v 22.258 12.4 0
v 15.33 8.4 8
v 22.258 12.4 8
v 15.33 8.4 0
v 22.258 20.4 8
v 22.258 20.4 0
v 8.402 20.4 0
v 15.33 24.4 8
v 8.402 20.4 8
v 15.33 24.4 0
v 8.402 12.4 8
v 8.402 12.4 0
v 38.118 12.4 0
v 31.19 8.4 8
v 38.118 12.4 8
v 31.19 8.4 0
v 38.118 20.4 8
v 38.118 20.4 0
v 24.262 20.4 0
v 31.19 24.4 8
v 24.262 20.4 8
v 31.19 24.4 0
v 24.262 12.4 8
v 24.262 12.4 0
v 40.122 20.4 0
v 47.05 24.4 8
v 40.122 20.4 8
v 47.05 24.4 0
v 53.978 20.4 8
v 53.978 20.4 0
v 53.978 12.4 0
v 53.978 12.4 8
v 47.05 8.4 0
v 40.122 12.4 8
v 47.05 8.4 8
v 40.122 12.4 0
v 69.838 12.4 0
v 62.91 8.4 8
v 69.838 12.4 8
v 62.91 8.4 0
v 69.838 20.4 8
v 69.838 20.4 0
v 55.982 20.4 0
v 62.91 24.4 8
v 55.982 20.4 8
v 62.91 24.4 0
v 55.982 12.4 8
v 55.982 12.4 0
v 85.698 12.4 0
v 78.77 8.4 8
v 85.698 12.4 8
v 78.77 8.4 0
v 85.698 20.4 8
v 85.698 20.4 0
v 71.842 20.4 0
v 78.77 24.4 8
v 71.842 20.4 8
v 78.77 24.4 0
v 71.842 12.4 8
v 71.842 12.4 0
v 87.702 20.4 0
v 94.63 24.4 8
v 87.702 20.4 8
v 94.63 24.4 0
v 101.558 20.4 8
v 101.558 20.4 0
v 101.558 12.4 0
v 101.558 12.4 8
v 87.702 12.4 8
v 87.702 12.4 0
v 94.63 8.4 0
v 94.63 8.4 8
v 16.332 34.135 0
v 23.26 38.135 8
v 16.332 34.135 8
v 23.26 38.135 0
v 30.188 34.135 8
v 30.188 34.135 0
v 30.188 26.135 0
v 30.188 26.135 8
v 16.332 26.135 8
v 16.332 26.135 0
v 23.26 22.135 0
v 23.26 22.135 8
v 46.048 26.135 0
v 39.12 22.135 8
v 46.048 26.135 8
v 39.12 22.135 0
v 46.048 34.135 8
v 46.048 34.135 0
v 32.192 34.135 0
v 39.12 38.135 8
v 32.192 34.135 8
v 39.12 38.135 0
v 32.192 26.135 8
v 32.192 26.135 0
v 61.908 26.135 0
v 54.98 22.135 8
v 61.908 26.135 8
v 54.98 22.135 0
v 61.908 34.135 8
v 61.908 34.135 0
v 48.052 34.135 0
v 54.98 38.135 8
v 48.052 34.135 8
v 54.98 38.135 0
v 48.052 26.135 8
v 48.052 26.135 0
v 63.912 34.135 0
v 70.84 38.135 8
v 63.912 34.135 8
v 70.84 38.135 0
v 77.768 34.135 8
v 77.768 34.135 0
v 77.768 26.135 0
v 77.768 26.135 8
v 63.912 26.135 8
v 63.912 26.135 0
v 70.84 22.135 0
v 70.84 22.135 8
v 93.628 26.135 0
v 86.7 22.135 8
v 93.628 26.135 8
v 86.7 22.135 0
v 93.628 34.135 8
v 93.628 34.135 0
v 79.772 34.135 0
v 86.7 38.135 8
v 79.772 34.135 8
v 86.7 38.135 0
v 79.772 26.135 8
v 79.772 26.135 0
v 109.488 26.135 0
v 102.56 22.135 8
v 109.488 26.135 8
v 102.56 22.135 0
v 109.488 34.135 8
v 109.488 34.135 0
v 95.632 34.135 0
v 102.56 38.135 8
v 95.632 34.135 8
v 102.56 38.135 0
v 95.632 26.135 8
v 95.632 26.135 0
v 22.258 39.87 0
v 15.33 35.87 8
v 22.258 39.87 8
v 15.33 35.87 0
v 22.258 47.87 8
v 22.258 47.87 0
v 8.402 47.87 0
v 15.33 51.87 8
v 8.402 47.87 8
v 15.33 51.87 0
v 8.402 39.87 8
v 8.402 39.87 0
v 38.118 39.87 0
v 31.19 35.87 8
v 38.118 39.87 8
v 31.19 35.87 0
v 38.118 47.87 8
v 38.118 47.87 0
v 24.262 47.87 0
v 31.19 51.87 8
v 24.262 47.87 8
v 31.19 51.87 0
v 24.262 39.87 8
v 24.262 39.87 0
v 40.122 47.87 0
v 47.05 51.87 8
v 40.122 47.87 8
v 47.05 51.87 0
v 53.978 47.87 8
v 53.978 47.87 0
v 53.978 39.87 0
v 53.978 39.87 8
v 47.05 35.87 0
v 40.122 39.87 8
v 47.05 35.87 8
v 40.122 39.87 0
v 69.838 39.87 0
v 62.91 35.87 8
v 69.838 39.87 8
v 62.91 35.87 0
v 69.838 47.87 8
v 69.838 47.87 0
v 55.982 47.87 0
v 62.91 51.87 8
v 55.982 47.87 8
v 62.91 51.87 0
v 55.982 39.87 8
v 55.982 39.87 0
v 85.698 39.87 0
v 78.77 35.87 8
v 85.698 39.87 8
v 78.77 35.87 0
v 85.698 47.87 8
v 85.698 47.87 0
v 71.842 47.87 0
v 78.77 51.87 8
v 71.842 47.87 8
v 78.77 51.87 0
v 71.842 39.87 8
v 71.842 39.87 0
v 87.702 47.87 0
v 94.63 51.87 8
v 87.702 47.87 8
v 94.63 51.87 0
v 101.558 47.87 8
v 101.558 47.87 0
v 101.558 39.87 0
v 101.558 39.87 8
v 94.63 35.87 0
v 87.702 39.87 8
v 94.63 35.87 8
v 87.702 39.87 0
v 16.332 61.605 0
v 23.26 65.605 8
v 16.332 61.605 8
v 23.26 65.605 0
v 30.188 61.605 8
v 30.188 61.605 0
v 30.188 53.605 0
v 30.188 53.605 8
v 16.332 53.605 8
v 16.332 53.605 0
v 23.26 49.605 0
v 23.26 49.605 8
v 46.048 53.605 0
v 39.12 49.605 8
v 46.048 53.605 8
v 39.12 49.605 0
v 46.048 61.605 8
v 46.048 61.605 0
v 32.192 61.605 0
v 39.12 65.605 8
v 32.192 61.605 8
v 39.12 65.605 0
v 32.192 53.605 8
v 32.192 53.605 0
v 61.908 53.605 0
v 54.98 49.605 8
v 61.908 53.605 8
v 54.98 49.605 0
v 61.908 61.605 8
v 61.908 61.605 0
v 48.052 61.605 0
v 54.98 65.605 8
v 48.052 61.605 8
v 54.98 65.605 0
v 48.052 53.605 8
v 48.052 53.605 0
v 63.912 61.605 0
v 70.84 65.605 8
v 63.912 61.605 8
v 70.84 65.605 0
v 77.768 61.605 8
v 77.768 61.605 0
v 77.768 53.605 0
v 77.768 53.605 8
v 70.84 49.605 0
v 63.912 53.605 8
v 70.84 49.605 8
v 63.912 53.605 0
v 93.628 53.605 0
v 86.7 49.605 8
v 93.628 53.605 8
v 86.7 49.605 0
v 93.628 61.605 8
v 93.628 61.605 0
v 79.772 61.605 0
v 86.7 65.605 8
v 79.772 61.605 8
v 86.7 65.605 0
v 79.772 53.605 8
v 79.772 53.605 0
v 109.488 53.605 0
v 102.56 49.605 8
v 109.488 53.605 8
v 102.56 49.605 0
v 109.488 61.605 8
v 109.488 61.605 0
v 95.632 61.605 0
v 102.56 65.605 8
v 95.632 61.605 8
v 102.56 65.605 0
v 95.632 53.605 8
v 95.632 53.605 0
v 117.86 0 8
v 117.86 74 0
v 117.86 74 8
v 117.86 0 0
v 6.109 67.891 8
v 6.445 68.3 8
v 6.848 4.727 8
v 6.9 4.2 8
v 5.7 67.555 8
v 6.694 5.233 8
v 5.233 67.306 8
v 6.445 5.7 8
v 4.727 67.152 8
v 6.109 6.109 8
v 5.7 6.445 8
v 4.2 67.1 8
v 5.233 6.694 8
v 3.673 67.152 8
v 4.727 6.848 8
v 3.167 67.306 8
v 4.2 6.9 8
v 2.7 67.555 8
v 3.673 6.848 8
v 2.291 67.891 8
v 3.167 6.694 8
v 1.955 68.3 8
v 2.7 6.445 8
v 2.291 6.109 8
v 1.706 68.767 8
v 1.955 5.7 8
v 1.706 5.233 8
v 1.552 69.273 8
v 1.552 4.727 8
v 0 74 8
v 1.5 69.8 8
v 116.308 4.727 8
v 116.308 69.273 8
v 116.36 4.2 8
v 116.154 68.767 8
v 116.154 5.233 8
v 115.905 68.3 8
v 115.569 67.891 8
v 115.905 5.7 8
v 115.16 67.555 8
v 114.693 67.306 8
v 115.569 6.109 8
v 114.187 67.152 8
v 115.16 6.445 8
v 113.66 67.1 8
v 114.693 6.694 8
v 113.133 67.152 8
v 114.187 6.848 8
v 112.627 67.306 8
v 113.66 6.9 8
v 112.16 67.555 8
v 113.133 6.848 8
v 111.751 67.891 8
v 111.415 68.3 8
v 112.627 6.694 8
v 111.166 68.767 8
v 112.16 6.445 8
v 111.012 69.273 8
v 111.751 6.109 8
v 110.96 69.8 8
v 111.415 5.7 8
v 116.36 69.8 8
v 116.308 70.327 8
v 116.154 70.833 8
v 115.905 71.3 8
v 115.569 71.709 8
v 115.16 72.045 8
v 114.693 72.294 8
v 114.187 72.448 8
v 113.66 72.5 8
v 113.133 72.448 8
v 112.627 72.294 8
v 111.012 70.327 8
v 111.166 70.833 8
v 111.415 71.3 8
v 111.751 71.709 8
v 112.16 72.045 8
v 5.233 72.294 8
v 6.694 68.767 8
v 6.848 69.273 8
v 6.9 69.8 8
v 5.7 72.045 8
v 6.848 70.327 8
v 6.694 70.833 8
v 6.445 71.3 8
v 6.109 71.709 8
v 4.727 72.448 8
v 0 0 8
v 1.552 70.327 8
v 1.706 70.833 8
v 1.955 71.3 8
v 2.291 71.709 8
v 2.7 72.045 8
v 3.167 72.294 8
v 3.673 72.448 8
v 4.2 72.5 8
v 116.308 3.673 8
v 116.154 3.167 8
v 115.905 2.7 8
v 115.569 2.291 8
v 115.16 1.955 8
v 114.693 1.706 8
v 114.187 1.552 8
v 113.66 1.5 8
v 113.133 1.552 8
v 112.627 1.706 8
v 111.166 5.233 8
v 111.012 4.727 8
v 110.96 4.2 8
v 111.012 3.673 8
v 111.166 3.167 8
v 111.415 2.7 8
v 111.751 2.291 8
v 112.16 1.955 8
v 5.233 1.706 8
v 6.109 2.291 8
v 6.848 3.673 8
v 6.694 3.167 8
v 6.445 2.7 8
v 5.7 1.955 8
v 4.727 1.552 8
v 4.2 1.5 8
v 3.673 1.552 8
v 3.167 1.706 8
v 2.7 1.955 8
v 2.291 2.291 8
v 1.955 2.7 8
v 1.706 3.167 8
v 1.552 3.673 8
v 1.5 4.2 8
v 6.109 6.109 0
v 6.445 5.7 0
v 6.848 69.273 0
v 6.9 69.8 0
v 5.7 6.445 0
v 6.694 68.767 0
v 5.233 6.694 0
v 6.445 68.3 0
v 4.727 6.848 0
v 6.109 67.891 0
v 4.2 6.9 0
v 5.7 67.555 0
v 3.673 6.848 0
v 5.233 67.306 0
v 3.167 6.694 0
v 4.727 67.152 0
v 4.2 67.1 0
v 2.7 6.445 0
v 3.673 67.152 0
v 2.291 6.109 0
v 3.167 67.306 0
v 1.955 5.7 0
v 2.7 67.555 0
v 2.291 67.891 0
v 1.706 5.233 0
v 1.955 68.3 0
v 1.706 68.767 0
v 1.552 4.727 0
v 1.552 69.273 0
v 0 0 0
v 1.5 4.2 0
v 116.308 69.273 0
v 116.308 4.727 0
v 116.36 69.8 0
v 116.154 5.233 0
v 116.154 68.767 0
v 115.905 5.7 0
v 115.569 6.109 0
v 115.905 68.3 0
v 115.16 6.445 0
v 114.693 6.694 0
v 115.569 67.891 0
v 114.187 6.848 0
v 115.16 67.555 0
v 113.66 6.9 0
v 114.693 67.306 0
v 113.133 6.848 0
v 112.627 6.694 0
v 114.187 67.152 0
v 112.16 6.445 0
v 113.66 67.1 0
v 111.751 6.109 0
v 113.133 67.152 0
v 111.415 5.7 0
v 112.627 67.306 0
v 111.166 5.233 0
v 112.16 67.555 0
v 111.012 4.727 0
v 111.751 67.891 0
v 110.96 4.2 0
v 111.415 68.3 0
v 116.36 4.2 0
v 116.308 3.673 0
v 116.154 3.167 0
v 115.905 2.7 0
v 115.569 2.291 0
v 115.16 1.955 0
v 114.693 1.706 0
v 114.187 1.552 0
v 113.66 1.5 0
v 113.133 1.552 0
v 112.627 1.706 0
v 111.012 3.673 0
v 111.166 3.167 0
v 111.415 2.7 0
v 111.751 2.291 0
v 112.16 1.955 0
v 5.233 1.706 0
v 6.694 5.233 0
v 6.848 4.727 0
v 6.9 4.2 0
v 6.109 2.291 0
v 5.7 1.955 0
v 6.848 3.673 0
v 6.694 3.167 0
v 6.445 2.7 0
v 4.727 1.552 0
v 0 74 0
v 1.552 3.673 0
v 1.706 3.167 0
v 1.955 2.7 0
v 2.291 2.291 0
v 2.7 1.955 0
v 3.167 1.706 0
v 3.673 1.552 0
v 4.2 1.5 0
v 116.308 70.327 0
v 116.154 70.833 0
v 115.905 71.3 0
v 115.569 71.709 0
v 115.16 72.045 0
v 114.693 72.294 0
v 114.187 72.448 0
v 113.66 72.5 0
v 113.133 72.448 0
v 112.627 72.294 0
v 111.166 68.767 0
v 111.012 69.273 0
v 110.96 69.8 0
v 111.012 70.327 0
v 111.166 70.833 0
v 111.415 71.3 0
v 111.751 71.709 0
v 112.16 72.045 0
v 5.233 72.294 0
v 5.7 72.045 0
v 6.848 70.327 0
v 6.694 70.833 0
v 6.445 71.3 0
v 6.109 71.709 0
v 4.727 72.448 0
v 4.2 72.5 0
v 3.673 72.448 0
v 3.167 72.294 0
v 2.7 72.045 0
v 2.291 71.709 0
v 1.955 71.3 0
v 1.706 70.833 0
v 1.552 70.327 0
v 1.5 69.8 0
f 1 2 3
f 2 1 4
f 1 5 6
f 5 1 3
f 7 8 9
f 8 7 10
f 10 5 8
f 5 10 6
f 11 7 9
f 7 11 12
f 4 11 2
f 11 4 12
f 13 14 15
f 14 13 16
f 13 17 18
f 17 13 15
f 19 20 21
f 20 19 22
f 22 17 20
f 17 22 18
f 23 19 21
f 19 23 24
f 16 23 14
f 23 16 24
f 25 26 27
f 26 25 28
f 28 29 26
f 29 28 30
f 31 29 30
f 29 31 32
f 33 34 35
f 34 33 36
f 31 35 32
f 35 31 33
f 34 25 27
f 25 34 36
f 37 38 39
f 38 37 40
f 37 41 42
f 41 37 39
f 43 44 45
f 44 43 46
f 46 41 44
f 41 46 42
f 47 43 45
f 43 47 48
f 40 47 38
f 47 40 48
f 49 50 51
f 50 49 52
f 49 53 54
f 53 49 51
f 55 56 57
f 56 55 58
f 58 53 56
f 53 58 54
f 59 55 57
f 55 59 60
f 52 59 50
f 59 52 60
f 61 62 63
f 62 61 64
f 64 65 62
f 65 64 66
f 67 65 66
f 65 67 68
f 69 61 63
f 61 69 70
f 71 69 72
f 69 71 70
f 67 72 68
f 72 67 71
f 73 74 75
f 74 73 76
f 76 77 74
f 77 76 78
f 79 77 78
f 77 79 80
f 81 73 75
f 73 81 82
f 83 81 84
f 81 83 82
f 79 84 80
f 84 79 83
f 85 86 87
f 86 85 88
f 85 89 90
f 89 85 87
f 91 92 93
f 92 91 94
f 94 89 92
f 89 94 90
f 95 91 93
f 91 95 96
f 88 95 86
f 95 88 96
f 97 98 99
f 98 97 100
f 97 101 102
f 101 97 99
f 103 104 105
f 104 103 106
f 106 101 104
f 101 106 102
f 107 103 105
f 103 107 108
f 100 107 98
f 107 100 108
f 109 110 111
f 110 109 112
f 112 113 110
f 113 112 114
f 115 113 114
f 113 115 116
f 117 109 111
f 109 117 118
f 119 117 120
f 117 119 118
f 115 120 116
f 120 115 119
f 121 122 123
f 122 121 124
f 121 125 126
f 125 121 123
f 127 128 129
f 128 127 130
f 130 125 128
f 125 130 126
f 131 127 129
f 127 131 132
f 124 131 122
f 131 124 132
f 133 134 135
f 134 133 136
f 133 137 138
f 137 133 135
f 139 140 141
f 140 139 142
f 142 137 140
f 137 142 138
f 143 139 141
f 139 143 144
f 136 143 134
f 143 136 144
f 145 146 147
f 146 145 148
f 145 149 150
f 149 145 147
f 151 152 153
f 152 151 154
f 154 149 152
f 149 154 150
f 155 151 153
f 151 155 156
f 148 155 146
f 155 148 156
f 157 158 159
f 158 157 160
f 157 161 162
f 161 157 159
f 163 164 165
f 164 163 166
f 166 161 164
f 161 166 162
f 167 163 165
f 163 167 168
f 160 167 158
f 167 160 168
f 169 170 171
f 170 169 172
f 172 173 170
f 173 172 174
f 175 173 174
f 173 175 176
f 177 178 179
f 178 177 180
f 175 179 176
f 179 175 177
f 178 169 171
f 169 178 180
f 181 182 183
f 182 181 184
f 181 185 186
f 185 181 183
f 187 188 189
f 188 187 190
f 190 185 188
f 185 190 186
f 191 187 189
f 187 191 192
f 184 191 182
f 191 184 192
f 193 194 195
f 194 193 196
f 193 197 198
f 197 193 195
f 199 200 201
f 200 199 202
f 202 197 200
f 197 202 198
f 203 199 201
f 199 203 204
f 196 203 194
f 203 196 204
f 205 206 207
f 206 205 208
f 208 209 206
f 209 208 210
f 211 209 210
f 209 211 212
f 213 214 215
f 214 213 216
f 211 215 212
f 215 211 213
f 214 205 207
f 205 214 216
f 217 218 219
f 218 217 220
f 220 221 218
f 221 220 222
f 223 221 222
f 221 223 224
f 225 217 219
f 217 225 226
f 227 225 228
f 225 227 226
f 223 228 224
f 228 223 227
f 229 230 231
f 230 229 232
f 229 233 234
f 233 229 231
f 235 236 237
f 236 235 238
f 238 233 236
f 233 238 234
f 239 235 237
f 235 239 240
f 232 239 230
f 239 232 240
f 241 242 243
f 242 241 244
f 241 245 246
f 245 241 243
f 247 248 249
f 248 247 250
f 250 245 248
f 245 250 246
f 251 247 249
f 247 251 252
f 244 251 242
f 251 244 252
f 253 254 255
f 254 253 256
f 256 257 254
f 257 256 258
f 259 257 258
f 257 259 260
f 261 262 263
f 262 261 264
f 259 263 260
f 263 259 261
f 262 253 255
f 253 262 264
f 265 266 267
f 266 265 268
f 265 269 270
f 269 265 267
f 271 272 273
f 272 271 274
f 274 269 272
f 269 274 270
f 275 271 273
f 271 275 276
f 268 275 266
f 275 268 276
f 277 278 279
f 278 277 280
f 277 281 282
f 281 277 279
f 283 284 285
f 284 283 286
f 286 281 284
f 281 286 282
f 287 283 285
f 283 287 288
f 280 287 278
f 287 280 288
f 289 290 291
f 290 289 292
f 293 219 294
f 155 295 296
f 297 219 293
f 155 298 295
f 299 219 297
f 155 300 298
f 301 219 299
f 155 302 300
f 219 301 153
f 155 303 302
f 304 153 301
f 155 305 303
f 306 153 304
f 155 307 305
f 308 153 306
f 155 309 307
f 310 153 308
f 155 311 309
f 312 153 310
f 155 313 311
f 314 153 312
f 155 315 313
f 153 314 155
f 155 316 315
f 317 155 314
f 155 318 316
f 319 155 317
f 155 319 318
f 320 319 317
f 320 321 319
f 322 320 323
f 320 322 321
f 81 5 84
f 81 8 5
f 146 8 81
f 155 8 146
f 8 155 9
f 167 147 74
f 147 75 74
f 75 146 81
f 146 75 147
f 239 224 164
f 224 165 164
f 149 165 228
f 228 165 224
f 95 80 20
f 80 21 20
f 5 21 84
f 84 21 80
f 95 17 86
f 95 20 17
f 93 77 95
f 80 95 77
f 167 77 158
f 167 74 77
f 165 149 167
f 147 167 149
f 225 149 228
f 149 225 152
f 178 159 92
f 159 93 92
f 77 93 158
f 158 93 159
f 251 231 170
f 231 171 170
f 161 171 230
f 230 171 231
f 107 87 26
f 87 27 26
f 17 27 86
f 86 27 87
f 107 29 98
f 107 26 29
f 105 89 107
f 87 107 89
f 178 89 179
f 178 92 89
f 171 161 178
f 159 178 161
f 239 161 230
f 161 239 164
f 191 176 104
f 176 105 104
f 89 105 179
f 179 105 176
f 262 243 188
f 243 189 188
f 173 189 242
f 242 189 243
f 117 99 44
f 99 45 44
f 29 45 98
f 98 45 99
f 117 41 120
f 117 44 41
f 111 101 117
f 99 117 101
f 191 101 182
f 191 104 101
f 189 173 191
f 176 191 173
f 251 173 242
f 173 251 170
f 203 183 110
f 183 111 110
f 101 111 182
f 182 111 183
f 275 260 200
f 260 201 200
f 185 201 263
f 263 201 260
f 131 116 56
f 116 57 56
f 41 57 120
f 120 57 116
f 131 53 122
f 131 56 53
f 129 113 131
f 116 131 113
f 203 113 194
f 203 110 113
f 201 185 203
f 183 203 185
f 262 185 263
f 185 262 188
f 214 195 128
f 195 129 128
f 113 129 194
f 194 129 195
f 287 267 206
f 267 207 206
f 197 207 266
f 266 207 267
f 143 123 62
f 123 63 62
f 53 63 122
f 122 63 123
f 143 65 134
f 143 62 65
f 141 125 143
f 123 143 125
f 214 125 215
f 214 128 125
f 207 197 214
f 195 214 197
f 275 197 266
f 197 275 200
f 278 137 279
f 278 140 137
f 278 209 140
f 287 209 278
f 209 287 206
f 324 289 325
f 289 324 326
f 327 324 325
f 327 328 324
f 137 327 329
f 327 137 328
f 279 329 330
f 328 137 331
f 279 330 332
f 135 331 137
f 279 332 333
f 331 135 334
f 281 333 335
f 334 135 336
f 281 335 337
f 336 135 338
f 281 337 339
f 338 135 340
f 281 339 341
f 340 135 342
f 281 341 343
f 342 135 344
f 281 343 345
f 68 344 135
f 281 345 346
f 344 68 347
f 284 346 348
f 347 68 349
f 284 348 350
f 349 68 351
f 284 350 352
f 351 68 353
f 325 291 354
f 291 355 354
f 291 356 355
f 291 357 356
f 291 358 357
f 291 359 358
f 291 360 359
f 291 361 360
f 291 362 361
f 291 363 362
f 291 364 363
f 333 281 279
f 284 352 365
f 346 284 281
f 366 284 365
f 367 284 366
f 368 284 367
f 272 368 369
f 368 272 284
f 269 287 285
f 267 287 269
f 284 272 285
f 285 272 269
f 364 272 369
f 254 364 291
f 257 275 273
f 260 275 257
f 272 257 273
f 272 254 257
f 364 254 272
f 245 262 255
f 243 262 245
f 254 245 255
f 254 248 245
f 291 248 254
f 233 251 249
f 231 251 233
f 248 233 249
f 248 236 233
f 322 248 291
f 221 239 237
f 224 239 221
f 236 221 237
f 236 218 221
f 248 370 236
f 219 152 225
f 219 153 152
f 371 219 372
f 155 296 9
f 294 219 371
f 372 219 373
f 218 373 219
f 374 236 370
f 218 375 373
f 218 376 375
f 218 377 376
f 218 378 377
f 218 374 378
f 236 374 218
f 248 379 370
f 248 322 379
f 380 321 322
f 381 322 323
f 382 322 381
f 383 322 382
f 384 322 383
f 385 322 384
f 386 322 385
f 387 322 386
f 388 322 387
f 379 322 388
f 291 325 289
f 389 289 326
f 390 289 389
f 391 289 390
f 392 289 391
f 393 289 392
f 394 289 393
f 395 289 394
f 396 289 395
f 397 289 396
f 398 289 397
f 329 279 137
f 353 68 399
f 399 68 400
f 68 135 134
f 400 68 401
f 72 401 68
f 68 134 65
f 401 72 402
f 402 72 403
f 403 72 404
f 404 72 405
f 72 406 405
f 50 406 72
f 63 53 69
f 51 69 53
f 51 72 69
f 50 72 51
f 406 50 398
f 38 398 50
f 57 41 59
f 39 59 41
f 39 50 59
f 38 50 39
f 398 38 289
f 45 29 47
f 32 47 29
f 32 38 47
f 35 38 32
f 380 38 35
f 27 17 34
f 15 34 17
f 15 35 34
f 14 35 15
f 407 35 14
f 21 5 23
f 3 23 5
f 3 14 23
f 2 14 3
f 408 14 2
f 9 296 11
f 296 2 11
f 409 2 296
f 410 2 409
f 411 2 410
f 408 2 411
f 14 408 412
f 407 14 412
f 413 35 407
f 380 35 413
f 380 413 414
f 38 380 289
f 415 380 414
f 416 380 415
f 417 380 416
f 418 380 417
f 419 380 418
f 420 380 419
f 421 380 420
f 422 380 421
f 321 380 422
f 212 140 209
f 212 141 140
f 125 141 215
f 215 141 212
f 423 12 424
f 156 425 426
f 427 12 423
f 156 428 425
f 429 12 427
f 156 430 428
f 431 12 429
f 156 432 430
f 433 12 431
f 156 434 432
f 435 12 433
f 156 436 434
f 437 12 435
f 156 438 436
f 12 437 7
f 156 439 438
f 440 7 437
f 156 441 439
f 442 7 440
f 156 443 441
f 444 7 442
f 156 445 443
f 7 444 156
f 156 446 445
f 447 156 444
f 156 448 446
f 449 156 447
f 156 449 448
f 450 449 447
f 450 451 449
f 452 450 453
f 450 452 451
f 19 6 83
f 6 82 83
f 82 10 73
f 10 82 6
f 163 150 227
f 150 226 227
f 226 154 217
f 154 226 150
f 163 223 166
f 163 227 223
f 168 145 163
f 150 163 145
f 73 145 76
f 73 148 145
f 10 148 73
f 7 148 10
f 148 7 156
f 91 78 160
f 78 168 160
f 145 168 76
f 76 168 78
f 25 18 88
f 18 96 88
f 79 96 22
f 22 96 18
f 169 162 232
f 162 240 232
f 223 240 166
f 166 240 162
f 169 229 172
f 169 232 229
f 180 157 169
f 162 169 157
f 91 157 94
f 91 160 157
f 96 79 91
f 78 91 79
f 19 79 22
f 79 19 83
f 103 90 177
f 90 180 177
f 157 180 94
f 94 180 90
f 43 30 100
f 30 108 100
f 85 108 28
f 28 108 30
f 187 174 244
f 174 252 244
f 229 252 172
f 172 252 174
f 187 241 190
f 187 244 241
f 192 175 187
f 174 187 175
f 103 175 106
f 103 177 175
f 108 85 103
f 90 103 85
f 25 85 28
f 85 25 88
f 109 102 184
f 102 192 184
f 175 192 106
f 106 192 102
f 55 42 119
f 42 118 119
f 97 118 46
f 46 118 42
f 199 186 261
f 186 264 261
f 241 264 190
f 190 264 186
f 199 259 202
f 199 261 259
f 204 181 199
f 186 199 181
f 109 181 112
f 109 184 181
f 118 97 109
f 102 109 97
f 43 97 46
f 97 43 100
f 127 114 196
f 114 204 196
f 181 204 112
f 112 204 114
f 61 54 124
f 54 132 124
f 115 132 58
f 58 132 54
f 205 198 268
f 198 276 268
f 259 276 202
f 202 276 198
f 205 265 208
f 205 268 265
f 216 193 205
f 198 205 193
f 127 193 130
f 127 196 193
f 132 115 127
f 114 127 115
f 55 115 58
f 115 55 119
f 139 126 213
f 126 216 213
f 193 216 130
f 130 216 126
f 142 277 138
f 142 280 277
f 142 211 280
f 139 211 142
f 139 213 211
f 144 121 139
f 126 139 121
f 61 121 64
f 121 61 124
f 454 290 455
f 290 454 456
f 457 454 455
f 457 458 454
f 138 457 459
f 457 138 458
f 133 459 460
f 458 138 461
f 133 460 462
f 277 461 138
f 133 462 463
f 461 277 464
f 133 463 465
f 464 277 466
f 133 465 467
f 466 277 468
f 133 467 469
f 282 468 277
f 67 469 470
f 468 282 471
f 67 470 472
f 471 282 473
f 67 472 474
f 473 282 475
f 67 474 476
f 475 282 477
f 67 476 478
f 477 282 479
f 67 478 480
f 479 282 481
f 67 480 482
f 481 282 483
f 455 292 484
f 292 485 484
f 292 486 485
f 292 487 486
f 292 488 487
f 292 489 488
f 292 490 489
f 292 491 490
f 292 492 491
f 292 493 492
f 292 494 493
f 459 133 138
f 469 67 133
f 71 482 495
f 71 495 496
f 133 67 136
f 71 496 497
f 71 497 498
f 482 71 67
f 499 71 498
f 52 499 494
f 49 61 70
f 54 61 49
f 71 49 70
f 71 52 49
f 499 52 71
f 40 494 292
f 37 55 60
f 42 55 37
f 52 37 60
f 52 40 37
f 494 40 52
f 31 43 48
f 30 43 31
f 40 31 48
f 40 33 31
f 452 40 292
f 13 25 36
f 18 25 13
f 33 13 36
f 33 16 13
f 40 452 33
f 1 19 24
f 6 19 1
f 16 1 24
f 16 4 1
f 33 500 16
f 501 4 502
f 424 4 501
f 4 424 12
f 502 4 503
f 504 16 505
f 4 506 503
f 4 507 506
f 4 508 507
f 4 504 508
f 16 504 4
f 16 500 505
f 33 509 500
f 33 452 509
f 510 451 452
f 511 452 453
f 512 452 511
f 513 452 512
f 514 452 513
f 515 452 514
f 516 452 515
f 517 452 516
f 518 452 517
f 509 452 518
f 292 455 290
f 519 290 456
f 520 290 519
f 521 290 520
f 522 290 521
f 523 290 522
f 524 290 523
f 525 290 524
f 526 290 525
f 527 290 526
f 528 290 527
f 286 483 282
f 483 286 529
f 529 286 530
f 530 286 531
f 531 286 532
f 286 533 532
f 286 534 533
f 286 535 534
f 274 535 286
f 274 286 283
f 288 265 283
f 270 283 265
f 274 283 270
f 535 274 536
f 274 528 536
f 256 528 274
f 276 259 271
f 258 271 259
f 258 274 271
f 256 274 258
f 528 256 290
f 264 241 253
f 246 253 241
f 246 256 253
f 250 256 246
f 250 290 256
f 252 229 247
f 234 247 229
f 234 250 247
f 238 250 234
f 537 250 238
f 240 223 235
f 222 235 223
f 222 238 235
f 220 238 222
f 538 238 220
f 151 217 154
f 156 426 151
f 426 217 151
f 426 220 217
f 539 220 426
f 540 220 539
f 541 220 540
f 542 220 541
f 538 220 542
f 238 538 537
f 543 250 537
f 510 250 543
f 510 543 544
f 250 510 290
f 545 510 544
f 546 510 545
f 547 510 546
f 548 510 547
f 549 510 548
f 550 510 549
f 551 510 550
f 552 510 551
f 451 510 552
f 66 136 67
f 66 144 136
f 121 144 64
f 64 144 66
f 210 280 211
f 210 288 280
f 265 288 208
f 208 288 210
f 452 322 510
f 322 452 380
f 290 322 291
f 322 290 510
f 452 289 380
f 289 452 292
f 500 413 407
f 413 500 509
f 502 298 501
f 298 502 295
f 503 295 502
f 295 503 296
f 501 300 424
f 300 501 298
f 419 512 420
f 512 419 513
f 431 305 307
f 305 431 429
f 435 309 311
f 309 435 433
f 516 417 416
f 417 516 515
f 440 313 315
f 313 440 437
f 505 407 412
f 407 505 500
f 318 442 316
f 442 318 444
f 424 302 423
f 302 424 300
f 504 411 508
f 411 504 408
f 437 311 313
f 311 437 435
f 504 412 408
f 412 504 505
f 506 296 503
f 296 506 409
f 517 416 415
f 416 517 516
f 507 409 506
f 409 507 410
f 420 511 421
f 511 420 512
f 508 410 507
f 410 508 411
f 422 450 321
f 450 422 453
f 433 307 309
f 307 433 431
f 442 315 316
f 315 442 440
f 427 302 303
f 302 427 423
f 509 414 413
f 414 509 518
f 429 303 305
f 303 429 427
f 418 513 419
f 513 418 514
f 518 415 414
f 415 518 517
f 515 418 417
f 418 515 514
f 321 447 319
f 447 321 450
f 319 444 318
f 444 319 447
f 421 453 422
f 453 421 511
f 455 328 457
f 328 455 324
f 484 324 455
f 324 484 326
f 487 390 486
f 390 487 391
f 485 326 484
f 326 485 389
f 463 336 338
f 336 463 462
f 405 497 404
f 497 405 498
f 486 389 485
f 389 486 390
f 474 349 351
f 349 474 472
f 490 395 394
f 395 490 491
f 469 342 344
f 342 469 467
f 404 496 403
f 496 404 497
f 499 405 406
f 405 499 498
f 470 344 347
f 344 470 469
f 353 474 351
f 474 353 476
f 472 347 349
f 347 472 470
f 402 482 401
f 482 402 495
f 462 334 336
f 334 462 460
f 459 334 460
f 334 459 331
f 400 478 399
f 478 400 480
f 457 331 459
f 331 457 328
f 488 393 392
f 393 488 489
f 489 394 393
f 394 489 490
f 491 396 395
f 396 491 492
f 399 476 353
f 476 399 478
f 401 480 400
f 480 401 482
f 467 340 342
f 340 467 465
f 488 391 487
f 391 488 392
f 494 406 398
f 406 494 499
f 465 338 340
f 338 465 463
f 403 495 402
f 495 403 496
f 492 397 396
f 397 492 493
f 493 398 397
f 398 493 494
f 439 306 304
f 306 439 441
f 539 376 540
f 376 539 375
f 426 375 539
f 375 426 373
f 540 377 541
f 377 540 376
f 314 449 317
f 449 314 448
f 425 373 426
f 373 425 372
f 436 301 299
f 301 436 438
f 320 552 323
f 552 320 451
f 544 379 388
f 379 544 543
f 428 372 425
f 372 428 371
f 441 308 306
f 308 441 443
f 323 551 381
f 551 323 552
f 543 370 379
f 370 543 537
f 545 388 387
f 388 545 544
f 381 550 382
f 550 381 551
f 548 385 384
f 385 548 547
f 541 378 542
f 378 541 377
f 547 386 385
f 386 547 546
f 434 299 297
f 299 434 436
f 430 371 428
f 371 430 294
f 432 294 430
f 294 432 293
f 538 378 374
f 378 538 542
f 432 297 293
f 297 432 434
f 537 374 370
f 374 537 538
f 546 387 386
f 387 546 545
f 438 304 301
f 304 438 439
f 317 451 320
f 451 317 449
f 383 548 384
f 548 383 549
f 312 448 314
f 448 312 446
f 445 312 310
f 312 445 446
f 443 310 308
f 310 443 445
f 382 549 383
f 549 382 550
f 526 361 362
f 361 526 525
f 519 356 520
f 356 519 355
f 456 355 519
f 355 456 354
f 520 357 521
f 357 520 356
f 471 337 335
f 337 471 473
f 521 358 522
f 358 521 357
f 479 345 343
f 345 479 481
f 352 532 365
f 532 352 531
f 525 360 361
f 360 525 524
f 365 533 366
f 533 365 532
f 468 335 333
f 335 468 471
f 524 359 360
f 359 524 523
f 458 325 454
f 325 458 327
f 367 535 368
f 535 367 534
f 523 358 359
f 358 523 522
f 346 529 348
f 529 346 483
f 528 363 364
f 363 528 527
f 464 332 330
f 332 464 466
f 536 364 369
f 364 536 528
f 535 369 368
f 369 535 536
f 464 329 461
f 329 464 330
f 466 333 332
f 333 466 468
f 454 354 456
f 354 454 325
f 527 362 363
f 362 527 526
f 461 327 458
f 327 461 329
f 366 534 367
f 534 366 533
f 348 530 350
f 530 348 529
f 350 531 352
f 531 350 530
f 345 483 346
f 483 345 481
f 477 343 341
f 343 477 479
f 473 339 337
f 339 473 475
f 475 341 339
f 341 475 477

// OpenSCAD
$fn = 32;

// ----------------------------------------------------------------------
// Honeycomb panel: 117.86 x 74 mm, 24 cells of 16 mm
// ----------------------------------------------------------------------

// --- parameters (mm) ---
panel_w = 117.86;         // panel width
panel_d = 74;             // panel depth
thick = 8;                // panel thickness
cell_r = 8;               // hex cell circumradius
pitch = 15.86;            // hex cell pitch (centre to centre)
web = 2;                  // web between the cells
columns = 6;              // columns of cells
rows = 4;                 // rows of cells
cell_count = 24;          // total cells
shift_x = 15.33;          // first cell offset in x
shift_y = 16.4;           // first cell offset in y
mount_d = 5.4;            // corner mounting holes
hole_off = 4.2;           // mounting hole offset from the corners

difference() {
  union() {
    cube([panel_w, panel_d, thick]);
  }
  /* hexagonal cells, point-up, cut right through the plate */
  for (row = [0 : rows - 1]) {
    for (col = [0 : columns - 1]) {
      translate([shift_x + col * pitch + (row % 2) * pitch / 2, shift_y + row * pitch * 0.866025, -2.5]) rotate([0, 0, 30]) cylinder(h = thick + 5, d = 2 * cell_r, $fn = 6);
    }
  }
  /* corner mounting holes, clear of the outer cell web */
  translate([4.2, 4.2, -2.5]) cylinder(h = thick + 5, d = mount_d);
  translate([113.66, 4.2, -2.5]) cylinder(h = thick + 5, d = mount_d);
  translate([4.2, 69.8, -2.5]) cylinder(h = thick + 5, d = mount_d);
  translate([113.66, 69.8, -2.5]) cylinder(h = thick + 5, d = mount_d);
}
